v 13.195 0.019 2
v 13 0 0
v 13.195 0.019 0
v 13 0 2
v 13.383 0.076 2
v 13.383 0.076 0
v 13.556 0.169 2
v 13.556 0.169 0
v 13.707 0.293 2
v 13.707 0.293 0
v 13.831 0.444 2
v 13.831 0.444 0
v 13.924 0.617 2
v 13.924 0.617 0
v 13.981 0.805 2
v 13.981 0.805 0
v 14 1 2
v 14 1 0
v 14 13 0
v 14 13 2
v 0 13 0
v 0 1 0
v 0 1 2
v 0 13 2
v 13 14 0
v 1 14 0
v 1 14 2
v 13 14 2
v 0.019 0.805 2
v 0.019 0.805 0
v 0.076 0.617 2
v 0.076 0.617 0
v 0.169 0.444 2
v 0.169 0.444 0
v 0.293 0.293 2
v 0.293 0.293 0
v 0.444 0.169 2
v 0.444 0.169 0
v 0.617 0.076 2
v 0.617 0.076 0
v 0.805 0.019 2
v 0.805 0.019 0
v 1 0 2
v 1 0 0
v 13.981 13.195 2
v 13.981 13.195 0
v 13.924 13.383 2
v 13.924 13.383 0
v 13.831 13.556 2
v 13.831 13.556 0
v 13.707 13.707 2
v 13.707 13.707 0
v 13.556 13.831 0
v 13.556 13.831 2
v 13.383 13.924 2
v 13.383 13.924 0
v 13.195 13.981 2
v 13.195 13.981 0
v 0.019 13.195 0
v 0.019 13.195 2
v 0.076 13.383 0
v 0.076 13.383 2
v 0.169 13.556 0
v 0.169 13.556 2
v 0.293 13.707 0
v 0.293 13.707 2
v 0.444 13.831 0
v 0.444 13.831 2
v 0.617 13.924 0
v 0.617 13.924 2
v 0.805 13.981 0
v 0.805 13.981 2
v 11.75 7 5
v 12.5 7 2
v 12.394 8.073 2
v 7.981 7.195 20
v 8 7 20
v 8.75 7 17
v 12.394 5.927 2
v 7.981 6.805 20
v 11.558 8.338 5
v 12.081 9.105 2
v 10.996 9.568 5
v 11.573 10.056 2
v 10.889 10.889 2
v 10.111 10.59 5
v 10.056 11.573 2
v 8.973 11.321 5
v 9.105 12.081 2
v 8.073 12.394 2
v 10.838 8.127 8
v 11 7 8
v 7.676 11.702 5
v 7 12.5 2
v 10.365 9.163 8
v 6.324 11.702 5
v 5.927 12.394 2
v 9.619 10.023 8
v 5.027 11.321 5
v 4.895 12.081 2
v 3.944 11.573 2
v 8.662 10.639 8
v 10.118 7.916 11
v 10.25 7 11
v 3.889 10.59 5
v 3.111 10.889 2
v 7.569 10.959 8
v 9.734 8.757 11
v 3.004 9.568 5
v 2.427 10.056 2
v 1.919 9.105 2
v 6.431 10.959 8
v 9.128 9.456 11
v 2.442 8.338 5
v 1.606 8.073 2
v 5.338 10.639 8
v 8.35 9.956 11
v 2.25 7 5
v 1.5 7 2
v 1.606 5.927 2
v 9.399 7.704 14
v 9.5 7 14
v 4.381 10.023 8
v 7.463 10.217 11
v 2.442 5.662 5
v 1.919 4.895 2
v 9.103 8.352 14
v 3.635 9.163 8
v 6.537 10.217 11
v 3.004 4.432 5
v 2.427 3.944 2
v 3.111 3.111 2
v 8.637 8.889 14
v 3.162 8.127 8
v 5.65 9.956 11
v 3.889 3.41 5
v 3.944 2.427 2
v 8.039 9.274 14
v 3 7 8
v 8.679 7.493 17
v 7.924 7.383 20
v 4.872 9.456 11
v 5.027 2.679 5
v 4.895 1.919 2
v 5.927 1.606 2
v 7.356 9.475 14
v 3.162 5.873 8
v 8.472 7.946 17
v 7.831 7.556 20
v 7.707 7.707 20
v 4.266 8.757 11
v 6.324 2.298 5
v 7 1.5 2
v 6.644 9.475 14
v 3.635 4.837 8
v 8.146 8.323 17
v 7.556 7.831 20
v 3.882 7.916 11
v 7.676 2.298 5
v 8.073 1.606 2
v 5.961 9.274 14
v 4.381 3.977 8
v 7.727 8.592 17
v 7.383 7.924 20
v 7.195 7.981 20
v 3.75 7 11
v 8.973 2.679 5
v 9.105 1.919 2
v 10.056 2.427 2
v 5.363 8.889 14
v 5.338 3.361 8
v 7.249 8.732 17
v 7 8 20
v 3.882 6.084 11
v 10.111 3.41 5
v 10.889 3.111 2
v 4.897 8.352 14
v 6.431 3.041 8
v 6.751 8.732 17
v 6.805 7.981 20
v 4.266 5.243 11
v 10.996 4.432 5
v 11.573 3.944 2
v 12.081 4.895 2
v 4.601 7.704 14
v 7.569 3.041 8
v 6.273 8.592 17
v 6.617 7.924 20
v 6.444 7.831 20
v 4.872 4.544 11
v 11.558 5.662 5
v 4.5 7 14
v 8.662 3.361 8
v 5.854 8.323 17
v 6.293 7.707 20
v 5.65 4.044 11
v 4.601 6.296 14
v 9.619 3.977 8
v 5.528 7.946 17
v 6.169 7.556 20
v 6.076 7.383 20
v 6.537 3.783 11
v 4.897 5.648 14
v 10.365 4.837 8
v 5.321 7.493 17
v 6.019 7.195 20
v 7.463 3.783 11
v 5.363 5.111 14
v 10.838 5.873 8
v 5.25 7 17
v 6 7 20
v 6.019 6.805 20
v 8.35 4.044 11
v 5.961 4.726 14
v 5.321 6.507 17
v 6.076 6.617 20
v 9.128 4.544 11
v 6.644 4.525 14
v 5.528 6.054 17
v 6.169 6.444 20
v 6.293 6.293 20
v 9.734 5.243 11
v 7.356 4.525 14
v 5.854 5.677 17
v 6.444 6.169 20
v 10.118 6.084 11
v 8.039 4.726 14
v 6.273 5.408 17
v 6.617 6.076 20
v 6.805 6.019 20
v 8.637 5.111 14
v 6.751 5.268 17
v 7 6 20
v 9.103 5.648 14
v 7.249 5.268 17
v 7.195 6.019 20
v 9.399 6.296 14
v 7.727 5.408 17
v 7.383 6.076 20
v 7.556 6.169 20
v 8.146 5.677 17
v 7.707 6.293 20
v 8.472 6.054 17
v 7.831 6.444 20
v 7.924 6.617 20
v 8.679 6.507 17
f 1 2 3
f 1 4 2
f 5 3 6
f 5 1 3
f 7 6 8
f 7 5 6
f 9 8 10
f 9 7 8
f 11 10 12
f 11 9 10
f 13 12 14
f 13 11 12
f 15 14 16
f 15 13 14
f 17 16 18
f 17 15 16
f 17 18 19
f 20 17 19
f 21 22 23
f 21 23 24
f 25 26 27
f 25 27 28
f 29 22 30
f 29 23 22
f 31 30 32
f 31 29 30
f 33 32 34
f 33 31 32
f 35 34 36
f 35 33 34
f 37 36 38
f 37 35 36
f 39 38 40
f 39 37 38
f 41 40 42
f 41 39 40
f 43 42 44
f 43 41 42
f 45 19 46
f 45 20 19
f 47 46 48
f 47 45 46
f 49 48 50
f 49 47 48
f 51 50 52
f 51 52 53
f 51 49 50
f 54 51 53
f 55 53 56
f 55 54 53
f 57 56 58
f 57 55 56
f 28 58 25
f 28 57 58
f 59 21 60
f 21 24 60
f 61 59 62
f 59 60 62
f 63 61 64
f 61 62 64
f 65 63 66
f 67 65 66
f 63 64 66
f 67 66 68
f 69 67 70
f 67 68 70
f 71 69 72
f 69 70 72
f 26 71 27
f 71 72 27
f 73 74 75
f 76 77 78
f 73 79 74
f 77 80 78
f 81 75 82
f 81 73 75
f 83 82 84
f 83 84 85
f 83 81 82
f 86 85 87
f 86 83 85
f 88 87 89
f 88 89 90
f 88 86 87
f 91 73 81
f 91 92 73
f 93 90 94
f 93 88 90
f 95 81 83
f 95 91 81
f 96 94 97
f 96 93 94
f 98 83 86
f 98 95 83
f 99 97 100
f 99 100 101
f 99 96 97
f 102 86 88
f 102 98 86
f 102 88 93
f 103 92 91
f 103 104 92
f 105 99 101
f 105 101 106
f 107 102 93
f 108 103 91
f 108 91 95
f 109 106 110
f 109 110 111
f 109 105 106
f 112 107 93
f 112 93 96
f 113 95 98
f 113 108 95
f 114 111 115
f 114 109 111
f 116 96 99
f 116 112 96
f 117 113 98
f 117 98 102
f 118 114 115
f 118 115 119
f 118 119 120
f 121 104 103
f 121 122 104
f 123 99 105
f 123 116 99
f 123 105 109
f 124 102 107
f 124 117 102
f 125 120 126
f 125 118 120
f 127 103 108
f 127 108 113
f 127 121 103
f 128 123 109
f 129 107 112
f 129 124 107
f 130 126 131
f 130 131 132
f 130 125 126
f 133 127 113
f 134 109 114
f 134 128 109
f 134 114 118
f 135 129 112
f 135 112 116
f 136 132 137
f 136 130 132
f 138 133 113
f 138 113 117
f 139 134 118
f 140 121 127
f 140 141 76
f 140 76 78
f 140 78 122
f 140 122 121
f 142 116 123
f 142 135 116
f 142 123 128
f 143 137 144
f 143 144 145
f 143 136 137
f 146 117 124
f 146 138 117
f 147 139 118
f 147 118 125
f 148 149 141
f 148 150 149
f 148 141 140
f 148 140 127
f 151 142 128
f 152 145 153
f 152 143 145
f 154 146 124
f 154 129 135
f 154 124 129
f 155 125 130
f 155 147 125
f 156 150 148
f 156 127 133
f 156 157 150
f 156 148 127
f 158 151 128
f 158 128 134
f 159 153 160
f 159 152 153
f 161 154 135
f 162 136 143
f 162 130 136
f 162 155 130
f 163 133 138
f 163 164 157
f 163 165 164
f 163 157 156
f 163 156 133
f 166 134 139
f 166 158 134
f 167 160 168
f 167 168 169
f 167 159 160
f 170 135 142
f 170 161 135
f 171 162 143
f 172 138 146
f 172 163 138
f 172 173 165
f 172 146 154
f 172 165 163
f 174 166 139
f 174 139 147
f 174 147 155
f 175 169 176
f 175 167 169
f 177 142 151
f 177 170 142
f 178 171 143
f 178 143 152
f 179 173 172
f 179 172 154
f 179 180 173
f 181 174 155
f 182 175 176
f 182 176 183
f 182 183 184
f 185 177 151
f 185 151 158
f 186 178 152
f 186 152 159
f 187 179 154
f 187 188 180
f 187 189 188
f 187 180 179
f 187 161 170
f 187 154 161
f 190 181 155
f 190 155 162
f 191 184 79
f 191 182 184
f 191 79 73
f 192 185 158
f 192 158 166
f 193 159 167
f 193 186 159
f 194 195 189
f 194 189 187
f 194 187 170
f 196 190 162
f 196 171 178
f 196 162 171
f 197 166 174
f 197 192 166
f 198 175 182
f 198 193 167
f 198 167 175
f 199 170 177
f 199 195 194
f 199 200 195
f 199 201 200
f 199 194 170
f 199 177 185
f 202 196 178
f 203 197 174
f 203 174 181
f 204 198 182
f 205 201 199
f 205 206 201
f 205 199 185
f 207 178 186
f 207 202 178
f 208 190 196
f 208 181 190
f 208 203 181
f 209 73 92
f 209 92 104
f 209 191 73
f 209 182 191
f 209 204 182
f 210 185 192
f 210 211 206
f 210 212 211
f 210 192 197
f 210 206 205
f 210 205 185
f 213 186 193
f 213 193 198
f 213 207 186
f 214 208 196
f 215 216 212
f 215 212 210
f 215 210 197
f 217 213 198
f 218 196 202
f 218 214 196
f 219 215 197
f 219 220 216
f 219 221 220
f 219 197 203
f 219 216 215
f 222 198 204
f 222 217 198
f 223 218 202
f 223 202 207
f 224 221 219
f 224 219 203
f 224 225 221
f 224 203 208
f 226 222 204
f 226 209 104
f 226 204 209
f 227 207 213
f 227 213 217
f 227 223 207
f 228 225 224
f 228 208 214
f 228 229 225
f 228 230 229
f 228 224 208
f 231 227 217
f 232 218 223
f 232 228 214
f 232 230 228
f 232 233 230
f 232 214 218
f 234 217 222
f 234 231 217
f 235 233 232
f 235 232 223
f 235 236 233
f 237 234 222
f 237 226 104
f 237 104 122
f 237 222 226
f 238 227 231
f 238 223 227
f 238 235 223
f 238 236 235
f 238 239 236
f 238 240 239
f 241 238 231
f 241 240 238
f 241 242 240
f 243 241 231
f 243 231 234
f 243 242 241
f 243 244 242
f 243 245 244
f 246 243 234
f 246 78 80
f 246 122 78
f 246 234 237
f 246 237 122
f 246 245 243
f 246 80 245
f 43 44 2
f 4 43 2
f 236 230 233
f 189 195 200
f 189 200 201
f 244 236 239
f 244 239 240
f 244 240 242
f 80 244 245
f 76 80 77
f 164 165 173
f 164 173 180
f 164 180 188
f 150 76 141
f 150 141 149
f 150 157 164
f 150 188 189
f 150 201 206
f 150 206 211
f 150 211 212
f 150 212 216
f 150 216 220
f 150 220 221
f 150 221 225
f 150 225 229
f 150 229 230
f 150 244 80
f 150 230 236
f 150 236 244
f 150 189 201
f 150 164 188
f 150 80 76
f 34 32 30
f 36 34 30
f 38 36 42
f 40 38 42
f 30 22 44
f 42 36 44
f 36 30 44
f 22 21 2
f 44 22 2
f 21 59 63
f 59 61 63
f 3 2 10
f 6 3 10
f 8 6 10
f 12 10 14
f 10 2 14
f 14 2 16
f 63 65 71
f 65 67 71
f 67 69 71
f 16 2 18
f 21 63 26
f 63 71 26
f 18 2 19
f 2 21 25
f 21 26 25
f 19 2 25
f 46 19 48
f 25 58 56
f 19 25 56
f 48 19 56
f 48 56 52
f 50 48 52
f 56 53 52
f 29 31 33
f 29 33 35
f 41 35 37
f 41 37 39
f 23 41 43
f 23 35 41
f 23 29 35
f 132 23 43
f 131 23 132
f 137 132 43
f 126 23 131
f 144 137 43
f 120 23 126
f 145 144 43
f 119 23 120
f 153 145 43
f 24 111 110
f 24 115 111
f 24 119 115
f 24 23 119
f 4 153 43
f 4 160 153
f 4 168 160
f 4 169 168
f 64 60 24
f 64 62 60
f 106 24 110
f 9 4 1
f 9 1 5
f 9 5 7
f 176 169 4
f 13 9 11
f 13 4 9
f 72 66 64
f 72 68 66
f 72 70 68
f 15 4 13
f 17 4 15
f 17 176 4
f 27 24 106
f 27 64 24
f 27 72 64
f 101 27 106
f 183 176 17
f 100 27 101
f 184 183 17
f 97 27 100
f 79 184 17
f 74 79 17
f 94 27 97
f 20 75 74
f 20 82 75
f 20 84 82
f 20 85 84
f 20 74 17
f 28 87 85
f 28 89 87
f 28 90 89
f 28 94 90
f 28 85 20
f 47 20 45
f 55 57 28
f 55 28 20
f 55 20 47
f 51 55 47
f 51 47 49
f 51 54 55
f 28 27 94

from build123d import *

# Parameters (mm, degrees)
BOX_W     = 14
BOX_H     = 14
BOX_DEPTH = 2
FILLET_R  = 1


with BuildPart() as fillet_body:
    # Box → Box (new body)
    with BuildSketch(Plane.XY):
        with Locations((7, 7)):
            Rectangle(BOX_W, BOX_H)
    extrude(amount=BOX_DEPTH)

    # Fillet
    fillet_edges = [fillet_body.edges().sort_by_distance(p)[0] for p in [
        (0, 0, 1),
        (0, 14, 1),
        (14, 0, 1),
        (14, 14, 1),
    ]]
    fillet(fillet_edges, radius=FILLET_R)


with BuildPart() as fusion:
    # Cone → Cone (revolve)
    with BuildSketch(Plane(origin=(7, 7, 0), x_dir=(1, 0, 0), z_dir=(0, -1, 0))):
        Polygon((0, 0), (6, 0), (1, 20), (0, 20), align=None)
    revolve(axis=Axis((7, 7, 0), (0, 0, 1)))

    # Fusion: union Fillet body
    add(fillet_body.part)


solid = fusion.part
